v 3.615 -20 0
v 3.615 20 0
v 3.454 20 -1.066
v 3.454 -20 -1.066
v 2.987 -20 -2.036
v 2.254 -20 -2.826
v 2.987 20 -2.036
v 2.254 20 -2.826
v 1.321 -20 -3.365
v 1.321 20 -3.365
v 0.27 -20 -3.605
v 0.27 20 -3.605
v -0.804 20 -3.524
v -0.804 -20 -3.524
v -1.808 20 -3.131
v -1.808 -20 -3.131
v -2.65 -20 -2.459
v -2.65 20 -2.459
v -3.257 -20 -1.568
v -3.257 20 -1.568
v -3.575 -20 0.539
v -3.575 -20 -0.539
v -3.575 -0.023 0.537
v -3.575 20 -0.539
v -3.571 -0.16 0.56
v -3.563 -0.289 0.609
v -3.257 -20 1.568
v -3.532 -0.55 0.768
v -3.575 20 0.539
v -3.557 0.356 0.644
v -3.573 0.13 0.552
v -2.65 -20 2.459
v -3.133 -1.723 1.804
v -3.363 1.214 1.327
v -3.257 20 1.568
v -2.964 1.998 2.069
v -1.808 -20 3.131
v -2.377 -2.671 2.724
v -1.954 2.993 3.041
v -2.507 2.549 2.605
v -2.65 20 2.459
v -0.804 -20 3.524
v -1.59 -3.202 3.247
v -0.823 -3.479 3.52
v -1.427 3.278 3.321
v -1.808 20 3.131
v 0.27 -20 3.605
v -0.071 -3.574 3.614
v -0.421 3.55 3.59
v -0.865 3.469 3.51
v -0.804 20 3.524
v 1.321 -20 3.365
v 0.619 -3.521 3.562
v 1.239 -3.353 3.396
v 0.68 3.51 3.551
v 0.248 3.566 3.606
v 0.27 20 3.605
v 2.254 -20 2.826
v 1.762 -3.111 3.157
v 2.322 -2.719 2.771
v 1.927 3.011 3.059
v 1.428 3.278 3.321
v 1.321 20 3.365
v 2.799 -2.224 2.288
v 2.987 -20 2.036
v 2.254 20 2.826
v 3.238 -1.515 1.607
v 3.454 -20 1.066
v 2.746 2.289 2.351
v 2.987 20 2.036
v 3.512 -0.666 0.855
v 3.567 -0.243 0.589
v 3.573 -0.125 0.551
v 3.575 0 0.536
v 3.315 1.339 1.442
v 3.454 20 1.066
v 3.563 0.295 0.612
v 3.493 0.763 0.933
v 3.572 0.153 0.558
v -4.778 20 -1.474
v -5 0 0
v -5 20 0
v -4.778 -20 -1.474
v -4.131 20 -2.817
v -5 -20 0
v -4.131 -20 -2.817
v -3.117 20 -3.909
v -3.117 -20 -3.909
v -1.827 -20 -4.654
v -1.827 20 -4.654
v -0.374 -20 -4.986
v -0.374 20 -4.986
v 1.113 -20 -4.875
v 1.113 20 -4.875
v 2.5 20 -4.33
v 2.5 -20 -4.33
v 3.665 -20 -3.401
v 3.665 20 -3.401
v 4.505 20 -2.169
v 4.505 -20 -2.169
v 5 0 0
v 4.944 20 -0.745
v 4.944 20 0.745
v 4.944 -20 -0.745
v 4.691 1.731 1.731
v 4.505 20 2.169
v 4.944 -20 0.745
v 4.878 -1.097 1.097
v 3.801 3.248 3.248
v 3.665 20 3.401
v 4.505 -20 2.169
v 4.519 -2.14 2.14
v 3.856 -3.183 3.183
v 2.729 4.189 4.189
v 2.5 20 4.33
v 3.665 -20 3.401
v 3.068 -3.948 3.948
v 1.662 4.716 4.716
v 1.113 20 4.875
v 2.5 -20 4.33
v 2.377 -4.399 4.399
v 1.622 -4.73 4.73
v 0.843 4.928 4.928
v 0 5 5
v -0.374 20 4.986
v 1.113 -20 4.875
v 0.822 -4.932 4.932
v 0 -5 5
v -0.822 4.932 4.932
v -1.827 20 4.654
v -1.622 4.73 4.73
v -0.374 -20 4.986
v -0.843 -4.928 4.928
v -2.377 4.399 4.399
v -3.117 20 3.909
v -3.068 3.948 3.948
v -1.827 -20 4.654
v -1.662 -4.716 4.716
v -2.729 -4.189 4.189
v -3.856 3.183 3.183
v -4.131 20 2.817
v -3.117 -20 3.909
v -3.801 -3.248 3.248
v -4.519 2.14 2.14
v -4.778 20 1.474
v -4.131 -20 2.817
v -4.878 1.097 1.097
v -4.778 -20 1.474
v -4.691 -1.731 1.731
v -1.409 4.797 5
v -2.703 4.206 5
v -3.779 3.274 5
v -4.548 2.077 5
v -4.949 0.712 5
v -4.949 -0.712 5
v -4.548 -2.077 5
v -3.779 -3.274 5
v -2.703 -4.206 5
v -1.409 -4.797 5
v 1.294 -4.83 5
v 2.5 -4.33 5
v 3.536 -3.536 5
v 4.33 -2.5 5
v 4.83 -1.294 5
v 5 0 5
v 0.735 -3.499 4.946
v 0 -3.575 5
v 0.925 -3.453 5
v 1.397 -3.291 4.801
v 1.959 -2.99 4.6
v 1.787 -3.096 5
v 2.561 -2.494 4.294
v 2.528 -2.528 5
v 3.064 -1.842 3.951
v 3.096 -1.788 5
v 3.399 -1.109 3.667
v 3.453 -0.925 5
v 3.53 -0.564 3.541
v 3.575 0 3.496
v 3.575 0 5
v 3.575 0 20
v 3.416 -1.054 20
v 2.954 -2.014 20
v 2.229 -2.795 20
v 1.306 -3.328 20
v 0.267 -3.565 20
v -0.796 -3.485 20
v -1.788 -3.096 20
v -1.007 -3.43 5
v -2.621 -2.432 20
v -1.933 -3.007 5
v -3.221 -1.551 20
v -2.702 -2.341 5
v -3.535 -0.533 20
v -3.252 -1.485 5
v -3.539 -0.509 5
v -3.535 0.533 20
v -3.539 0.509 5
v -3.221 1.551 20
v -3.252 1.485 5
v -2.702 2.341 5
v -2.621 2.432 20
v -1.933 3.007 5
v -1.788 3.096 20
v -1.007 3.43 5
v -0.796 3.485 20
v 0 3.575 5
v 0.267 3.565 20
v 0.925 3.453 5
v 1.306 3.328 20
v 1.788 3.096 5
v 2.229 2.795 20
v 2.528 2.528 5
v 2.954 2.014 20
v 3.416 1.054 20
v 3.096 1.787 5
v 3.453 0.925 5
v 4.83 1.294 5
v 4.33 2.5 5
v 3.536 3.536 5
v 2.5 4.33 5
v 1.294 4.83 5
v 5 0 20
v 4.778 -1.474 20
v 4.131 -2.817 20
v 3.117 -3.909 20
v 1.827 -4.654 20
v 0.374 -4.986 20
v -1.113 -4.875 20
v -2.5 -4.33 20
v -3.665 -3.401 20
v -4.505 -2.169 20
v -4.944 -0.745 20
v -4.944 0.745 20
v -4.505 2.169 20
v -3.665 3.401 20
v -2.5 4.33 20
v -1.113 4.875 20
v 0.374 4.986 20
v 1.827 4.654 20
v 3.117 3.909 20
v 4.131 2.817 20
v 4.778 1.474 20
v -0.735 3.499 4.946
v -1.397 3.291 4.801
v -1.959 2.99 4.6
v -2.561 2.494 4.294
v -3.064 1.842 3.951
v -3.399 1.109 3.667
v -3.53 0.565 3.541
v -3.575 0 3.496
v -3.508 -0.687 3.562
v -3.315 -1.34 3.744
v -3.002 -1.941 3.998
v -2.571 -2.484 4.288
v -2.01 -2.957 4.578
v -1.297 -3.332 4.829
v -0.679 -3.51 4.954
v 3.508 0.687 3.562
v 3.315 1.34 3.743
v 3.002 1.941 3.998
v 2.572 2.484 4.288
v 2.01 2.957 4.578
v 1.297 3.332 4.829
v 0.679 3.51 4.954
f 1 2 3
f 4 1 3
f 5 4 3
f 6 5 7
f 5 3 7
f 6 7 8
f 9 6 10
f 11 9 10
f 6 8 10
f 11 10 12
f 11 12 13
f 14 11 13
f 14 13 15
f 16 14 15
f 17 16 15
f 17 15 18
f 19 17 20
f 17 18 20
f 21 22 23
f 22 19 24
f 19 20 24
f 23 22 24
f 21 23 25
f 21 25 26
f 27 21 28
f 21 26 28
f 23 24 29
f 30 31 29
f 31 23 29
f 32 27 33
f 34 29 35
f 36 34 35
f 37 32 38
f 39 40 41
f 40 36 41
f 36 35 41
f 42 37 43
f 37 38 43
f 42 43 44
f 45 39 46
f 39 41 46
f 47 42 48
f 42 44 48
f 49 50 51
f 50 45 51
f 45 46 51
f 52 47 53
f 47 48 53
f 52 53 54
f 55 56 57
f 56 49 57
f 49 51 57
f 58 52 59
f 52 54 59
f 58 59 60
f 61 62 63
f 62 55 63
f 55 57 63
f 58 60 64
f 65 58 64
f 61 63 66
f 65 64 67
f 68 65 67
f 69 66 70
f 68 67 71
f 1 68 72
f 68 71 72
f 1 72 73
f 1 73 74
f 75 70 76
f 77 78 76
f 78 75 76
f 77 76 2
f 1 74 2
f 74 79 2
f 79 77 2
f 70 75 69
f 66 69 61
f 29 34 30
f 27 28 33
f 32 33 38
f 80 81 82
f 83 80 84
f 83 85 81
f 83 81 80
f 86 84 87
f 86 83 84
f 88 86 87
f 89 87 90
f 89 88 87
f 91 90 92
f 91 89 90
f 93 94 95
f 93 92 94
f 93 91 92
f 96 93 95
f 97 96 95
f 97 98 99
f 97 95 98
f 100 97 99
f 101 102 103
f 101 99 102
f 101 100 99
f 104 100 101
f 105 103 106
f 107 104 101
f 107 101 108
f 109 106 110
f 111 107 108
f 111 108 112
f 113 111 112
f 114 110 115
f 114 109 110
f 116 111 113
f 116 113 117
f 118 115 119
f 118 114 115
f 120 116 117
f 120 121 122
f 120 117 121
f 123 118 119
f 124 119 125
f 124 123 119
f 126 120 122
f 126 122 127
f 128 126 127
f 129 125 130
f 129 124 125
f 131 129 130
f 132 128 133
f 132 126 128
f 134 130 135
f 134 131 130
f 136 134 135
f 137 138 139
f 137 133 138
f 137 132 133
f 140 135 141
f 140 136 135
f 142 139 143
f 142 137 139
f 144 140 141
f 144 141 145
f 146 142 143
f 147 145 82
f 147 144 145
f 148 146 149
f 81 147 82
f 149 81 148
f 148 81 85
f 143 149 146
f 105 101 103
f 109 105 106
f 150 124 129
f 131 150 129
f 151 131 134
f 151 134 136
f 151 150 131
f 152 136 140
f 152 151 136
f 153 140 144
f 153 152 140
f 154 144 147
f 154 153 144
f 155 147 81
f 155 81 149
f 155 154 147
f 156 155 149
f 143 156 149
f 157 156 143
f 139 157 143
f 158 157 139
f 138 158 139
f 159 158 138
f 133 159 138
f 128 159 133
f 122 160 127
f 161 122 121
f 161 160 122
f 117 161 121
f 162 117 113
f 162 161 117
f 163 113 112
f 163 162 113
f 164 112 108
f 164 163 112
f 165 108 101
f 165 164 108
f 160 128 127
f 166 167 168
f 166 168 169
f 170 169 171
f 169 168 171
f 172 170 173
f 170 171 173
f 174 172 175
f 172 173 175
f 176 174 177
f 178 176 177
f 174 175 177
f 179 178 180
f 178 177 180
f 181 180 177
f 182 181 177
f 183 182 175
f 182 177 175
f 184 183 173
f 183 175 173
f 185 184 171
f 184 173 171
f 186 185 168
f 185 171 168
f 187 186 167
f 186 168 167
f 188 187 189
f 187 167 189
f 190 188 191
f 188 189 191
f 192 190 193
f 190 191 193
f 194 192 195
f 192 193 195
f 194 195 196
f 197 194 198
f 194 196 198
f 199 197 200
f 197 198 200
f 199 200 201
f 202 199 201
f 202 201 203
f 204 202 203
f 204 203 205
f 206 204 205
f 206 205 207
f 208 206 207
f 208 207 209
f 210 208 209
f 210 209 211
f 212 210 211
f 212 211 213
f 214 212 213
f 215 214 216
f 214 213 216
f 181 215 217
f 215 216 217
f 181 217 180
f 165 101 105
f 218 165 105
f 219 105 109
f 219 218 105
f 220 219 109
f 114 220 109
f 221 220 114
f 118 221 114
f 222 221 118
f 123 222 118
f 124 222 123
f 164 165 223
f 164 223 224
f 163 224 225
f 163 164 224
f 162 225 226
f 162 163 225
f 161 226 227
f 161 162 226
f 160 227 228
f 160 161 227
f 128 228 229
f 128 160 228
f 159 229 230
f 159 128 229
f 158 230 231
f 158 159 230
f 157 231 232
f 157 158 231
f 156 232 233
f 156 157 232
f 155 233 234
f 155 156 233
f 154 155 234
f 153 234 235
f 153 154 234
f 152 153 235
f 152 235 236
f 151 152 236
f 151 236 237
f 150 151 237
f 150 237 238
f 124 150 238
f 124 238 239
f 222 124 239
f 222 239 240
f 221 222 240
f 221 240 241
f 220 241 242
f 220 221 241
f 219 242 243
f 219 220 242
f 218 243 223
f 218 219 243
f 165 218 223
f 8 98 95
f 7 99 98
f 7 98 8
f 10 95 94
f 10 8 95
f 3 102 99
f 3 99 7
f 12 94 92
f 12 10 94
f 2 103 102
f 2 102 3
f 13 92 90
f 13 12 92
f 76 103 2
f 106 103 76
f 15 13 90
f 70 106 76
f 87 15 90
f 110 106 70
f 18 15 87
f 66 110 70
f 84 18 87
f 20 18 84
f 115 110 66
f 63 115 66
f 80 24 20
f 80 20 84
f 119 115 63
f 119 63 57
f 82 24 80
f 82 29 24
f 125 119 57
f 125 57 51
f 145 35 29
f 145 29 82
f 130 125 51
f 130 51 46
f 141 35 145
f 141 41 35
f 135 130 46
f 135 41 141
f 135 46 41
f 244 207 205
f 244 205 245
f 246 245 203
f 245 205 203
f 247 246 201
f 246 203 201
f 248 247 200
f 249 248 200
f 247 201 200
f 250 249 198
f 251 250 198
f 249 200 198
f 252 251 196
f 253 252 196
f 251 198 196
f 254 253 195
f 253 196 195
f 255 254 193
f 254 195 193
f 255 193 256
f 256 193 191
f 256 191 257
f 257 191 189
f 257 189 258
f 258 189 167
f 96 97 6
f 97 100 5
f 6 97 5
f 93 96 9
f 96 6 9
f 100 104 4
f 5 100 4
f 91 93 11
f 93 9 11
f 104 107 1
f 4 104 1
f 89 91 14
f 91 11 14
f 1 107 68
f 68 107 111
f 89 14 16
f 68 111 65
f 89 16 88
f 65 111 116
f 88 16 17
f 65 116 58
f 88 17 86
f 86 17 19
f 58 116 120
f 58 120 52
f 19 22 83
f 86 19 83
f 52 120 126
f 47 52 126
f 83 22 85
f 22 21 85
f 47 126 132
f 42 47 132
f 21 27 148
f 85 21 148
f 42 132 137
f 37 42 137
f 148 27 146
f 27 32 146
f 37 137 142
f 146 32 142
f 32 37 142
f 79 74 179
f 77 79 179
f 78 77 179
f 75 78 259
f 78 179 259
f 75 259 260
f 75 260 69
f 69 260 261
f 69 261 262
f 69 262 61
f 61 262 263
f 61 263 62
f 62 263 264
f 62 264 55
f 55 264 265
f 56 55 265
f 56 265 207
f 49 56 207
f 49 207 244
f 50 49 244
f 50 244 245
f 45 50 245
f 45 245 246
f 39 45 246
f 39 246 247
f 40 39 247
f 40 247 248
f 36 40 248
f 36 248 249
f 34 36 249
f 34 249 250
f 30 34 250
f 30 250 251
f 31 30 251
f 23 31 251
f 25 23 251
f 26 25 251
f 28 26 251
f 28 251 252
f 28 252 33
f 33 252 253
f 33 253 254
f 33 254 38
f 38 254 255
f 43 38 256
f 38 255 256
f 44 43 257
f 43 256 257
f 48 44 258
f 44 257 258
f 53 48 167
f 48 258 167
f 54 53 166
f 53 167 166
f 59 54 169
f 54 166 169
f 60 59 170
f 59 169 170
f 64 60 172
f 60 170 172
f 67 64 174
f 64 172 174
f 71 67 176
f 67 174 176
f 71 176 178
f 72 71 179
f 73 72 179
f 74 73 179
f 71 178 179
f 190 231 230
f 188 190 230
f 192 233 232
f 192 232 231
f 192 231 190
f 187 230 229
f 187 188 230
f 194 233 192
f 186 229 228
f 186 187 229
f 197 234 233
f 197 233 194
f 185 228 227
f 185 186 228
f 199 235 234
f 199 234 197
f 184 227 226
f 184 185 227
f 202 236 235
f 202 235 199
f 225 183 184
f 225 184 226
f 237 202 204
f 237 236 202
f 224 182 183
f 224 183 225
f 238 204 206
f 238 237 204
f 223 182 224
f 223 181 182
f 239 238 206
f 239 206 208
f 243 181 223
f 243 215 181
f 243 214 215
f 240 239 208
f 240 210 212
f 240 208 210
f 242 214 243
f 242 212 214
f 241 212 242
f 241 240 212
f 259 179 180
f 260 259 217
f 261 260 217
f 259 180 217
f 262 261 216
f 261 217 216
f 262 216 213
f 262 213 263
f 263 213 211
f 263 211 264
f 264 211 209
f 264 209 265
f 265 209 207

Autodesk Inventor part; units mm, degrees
ref_plane "YZ Plane" through (0, 0, 0) normal (1, 0, 0) x (0, 1, 0)
ref_plane "XZ Plane" through (0, 0, 0) normal (0, 1, 0) x (-1, 0, 0)
sketch "Sketch1" plane through (0, 0, 0) normal (0, 1, 0) x (-1, 0, 0)
  circle A0 centre (0, 0) radius 3.575
  circle A1 centre (0, 0) radius 5
  dimension "d0" = 7.15
  dimension "d1" = 10
extrude "Extrusion1" add sketch "Sketch1" along normal mid plane 40
ref_plane "Work Plane1" through (0, 0, 5) normal (0, 0, 1) x (1, 0, 0)
sketch "Sketch2" plane through (0, 0, 5) normal (0, 0, 1) x (1, 0, 0)
  circle A0 centre (0, 0) radius 3.575
  circle A1 centre (0, 0) radius 5
  line L0 (5, 20) -> (-5, 20) projected
  dimension "d4" = 7.15
  dimension "d5" = 10
  dimension "d22" = 0
extrude "Extrusion2" add sketch "Sketch2" along normal blind 15 and the other way blind 5
sketch "Sketch3" plane through (0, 0, 20) normal (0, 0, 1) x (1, 0, 0)
  circle A0 centre (0, 0) radius 3.575
extrude "Extrusion3" cut sketch "Sketch3" against normal up to surface
sketch "Sketch4" plane through (0, 20, 0) normal (0, 1, 0) x (1, 0, 0)
  circle A0 centre (0, 0) radius 3.615
  dimension "d13" = 7.23
extrude "Extrusion4" cut sketch "Sketch4" against normal through all
sketch "Sketch5" plane through (0, 0, -5) normal (0, 0, 1) x (1, 0, 0)
  line L0 (5, 15) -> (-5, 15) projected
  line L1 (-5, -15) -> (5, -15) projected
  line L2 (2, 15) -> (-2, 15)
  line L3 (-2, 15) -> (-2, -15)
  line L4 (-2, -15) -> (2, -15)
  line L5 (2, -15) -> (2, 15)
  point P0 (0, 0)
  dimension "d16" = 4
  dimension "d17" = 2
properties part number "T-joint"
